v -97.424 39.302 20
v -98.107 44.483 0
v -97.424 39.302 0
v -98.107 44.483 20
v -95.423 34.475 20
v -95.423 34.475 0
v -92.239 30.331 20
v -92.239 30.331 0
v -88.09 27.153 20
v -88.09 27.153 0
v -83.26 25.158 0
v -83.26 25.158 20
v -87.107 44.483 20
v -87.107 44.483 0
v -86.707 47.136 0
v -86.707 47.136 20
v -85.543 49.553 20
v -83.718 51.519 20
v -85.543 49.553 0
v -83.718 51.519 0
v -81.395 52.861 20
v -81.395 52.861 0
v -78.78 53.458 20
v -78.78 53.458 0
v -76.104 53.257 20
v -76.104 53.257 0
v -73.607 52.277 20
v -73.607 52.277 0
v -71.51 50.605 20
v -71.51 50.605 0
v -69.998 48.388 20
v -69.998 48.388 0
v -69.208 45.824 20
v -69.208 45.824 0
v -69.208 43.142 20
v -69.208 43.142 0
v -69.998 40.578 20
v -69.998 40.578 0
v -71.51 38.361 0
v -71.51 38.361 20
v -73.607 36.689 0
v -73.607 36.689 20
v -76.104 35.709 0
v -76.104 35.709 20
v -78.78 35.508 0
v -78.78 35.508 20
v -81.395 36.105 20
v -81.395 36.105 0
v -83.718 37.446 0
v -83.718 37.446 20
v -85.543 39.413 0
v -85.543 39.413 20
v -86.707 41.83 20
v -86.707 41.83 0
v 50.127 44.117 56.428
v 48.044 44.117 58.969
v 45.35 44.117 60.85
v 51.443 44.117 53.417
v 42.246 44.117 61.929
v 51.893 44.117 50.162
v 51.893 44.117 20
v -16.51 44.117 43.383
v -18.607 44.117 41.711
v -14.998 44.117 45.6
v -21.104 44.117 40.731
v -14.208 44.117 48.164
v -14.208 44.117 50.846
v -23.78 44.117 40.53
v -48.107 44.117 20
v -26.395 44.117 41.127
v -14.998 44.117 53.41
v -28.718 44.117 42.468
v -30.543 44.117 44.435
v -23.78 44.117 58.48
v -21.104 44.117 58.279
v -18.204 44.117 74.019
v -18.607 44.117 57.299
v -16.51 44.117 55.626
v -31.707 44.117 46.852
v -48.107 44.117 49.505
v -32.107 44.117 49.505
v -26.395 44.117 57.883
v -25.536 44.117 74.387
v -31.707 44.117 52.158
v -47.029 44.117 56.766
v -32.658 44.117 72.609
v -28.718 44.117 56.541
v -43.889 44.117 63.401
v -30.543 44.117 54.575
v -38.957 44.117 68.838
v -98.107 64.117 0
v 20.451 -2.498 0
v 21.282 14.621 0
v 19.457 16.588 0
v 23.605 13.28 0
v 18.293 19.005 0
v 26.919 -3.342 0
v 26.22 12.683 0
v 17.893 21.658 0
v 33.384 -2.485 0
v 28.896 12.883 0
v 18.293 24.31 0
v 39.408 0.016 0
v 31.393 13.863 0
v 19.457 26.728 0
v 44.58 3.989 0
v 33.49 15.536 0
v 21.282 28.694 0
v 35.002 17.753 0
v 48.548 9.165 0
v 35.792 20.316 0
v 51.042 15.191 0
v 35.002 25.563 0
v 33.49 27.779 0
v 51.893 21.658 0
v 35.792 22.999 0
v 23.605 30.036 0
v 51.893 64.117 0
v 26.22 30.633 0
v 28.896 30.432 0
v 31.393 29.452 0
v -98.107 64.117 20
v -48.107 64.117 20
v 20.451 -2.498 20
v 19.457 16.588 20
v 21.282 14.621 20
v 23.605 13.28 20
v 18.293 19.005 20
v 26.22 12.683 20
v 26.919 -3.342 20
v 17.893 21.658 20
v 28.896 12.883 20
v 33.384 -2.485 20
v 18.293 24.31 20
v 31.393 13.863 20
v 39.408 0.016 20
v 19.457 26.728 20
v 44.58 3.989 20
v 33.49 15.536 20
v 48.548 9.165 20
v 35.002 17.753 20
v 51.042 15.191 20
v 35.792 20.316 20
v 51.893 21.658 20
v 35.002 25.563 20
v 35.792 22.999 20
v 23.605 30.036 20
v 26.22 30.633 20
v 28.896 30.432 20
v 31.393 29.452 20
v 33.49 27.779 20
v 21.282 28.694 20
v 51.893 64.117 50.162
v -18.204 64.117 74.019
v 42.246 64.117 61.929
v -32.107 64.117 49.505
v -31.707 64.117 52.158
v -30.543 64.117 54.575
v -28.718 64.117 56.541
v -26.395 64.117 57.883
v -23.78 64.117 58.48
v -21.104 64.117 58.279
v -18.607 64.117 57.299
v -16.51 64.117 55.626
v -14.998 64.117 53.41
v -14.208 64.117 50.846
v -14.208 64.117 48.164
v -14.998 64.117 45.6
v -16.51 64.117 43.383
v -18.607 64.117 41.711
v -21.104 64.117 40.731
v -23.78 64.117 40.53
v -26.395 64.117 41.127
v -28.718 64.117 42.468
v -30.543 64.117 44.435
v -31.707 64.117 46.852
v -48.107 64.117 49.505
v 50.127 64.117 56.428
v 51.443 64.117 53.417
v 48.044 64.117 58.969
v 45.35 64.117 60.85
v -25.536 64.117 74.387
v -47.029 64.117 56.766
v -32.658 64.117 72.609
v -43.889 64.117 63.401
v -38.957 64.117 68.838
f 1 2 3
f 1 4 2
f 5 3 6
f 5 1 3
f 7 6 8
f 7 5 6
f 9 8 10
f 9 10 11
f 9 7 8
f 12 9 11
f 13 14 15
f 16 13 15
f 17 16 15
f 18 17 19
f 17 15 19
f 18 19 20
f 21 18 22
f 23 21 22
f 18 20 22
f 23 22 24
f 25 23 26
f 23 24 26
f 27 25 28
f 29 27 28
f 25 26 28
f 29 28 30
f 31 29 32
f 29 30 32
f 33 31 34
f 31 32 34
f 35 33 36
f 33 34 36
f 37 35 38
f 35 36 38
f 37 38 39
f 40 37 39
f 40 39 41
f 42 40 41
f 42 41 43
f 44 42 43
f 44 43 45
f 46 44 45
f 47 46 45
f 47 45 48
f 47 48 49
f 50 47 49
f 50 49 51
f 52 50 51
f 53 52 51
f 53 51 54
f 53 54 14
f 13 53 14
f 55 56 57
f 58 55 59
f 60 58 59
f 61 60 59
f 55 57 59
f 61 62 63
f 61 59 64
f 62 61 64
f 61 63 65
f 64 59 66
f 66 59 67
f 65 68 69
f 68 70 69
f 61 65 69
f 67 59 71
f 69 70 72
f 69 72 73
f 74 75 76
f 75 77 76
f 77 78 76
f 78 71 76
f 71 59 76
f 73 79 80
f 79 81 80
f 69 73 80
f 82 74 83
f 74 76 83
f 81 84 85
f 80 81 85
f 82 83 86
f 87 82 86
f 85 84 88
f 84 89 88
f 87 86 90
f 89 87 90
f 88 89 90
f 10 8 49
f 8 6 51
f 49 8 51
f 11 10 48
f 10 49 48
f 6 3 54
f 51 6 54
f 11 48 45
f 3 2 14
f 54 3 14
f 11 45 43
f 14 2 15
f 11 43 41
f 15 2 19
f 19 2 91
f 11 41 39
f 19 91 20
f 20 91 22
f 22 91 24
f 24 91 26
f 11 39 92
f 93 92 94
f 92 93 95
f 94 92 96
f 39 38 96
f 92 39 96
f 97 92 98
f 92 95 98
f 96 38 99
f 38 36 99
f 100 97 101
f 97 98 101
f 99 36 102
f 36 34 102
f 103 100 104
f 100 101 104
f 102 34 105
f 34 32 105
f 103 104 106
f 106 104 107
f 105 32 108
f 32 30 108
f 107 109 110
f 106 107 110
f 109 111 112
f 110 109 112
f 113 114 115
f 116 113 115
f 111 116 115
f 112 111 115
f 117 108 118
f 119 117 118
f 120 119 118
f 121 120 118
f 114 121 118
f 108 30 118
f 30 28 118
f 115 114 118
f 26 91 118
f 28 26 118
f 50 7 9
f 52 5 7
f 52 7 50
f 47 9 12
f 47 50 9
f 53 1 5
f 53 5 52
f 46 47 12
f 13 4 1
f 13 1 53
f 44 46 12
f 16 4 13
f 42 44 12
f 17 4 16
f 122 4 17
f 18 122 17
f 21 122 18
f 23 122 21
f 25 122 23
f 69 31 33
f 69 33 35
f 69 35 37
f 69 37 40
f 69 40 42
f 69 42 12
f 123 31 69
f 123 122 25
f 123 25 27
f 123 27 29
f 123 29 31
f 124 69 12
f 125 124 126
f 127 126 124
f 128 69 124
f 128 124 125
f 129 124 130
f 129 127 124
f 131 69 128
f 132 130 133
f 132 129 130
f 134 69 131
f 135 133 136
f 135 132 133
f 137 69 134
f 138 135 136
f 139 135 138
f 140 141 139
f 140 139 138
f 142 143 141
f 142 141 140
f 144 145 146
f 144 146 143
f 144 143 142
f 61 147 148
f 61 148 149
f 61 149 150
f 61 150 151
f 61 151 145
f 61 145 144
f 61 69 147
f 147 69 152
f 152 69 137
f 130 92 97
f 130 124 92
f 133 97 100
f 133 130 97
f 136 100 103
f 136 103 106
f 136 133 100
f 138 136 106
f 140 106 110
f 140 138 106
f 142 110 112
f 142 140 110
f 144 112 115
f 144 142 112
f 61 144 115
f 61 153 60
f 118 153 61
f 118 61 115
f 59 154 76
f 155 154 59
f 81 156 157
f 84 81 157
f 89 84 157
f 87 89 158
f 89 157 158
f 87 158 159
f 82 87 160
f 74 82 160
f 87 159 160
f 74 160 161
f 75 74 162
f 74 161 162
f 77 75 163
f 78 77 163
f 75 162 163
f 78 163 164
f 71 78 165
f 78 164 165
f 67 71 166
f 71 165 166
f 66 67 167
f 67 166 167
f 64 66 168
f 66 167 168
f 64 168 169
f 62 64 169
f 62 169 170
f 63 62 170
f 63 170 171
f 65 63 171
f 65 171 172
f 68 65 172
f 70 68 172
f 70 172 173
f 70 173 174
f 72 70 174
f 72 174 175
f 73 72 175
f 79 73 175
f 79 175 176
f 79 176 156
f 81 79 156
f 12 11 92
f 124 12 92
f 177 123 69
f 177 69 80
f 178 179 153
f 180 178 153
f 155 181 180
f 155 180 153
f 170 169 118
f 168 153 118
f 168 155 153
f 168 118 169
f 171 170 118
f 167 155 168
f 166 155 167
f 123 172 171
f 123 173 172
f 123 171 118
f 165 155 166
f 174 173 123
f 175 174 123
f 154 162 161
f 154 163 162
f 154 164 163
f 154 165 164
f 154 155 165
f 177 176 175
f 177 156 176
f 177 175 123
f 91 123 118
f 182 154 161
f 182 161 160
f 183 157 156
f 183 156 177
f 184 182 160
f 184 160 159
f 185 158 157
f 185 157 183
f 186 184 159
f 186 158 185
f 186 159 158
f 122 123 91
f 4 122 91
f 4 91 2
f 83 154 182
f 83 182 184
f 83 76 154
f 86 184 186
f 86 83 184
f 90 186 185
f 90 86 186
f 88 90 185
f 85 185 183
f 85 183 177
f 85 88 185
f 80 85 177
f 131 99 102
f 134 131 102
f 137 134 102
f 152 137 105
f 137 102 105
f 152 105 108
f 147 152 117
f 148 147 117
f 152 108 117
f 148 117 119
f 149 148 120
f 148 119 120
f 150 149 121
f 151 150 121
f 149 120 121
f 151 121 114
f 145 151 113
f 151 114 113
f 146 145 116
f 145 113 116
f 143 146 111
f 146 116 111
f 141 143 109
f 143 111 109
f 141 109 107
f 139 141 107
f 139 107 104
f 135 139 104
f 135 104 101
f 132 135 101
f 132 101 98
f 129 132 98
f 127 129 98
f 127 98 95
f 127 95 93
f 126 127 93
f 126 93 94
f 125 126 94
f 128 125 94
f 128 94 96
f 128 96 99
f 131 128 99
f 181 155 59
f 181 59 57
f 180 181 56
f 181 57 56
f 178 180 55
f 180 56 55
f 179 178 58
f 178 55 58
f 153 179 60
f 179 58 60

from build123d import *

# Parameters (mm, degrees)
F1_DEPTH = 20
F3_DEPTH = 20
F4_R     = 20
F5_R     = 25
F6_R     = 25
F7_R     = 12
F10_D    = 18
F11_D    = 18
F13_D    = 18


with BuildPart() as f1:
    # F0 (on Top) → F1 (new body)
    with BuildSketch(Plane.XY):
        Polygon((51.892916, 64.117395), (-98.107084, 64.117395), (-98.107084, 29.117395), (51.892916, -10.882605), align=None)
    extrude(amount=F1_DEPTH)

    # F2 (on face) → F3 (join)
    with BuildSketch(Plane(origin=(0, 64.117395, 0), x_dir=(-1, 0, 0), z_dir=(0, 1, 0))):
        Polygon((-51.892916, 60), (-51.892916, 20), (48.107084, 20), (48.107084, 80), align=None)
    extrude(amount=-F3_DEPTH)

    # F4
    f4_edges = [f1.edges().sort_by_distance(p)[0] for p in [
        (-98.107084, 29.117395, 10),
    ]]
    fillet(f4_edges, radius=F4_R)

    # F5
    f5_edges = [f1.edges().sort_by_distance(p)[0] for p in [
        (51.892916, -10.882605, 10),
    ]]
    fillet(f5_edges, radius=F5_R)

    # F6
    f6_edges = [f1.edges().sort_by_distance(p)[0] for p in [
        (-48.107084, 54.117395, 80),
    ]]
    fillet(f6_edges, radius=F6_R)

    # F7
    f7_edges = [f1.edges().sort_by_distance(p)[0] for p in [
        (51.892916, 54.117395, 60),
    ]]
    fillet(f7_edges, radius=F7_R)

    # F10 (through all)
    with Locations(Plane.XZ.offset(-44.117395)):
        with Locations((-23.107084, 49.504902)):
            Hole(F10_D / 2)

    # F11 (through all)
    with Locations(Plane.XY.offset(20)):
        with Locations((-78.107084, 44.482961)):
            Hole(F11_D / 2)

    # F13 (through all)
    with Locations(Plane.XY.offset(20)):
        with Locations((26.892916, 21.657686)):
            Hole(F13_D / 2)


solid = f1.part
